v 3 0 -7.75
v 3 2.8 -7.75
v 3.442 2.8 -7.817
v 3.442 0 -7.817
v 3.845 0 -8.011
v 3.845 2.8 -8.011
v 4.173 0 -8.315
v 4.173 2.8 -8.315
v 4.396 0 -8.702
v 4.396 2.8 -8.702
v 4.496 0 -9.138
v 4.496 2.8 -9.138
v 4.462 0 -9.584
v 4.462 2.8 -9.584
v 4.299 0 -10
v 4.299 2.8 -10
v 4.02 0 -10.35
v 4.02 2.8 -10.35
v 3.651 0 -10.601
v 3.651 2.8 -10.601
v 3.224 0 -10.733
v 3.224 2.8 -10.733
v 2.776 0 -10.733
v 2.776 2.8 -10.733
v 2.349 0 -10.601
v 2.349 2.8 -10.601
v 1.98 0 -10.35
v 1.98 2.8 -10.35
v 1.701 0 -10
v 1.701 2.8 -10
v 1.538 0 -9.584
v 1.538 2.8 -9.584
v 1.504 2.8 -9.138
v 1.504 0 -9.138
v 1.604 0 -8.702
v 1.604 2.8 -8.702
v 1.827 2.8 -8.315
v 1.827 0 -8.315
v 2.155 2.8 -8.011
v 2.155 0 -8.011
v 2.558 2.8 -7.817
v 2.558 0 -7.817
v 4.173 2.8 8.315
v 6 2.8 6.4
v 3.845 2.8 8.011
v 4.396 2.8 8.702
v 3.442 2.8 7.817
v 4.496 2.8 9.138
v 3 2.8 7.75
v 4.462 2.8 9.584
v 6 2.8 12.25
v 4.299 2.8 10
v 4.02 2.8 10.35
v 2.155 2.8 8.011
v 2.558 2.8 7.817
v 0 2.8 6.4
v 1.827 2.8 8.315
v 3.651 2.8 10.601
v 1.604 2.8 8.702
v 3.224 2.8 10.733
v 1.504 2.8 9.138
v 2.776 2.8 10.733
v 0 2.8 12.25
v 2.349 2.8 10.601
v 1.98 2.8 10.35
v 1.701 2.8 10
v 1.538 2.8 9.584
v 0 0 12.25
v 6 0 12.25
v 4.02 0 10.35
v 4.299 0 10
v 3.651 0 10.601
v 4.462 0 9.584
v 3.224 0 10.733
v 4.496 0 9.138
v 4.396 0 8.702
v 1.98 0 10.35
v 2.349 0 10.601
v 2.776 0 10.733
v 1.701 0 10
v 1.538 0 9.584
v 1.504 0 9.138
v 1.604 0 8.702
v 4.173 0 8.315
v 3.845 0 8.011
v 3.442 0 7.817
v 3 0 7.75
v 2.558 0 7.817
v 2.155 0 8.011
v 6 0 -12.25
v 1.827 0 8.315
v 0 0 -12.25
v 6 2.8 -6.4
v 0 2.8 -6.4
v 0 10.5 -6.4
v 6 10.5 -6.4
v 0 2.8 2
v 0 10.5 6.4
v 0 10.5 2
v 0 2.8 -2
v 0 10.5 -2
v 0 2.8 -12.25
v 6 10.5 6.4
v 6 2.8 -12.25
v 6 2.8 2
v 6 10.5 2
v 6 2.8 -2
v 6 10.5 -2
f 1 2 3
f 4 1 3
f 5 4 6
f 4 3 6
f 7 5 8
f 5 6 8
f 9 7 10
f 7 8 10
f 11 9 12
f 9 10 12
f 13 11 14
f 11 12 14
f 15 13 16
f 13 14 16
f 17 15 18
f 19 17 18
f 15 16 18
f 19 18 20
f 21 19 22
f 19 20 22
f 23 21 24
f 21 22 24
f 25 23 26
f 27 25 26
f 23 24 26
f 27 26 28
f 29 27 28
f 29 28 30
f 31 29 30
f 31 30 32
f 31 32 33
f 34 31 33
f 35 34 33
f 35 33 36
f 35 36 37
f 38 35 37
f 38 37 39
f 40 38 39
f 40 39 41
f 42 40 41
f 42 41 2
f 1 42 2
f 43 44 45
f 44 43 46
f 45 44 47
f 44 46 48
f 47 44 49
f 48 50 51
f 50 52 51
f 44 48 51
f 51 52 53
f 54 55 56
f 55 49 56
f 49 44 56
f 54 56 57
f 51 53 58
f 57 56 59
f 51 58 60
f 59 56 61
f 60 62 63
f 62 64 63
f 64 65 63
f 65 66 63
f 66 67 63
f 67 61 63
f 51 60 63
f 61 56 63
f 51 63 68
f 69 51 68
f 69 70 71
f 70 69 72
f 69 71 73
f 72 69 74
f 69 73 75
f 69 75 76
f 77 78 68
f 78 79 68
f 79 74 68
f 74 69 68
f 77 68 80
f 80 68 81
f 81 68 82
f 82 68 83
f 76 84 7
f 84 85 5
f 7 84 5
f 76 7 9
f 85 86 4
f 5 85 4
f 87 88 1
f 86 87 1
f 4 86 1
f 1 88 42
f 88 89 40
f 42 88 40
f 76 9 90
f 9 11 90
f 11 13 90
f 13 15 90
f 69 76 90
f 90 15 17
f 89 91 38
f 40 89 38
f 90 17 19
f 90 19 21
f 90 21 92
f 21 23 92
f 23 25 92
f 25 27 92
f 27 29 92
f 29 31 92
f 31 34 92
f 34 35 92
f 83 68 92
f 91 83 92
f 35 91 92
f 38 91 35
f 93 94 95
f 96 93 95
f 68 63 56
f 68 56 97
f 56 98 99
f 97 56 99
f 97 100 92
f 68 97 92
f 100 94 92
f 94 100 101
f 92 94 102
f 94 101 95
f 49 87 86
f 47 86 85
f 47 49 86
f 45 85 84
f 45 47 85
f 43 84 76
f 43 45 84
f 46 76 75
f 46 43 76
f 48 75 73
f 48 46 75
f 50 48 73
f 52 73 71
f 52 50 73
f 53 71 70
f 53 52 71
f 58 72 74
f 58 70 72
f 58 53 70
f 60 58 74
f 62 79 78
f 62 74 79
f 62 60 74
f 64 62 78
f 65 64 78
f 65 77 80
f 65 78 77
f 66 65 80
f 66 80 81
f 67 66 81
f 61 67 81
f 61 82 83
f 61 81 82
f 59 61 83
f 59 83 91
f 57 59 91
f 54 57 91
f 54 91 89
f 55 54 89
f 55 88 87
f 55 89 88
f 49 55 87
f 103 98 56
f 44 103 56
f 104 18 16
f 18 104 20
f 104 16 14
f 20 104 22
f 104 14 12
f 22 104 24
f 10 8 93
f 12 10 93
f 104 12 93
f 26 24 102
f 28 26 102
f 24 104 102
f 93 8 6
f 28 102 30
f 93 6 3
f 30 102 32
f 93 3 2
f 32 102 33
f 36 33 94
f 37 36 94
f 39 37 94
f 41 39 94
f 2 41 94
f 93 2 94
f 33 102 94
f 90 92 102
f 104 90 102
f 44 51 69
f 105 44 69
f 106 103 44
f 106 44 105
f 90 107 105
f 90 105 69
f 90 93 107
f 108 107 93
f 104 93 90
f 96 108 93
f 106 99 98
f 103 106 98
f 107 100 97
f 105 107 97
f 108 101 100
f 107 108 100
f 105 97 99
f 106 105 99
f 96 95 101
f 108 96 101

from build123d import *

# Parameters (mm, degrees)
EXTRUDE_1_DEPTH     = 6
SKETCH_2_R          = 1.5
CUT_EXTRUDE_1_DEPTH = 16.663731995


with BuildPart() as part:
    # 草圖1 → 填料-伸長1 (new body)
    with BuildSketch(Plane(origin=(0, 0, 0), x_dir=(0, 0, -1), z_dir=(1, 0, 0))):
        Polygon((-12.25, 0), (12.25, 0), (12.25, 2.8), (6.4, 2.8), (6.4, 10.5), (2, 10.5), (2, 2.8), (-2, 2.8), (-2, 10.5), (-6.4, 10.5), (-6.4, 2.8), (-12.25, 2.8), align=None)
    extrude(amount=EXTRUDE_1_DEPTH)

    # 草圖2 → 除料-伸長1 (cut, through all)
    with BuildSketch(Plane(origin=(0, 2.8, 0), x_dir=(1, 0, 0), z_dir=(0, 1, 0))):
        with Locations(Location((3, 9.25, 0), (0, 0, 270))):
            Circle(SKETCH_2_R)
    cut_extrude_1 = extrude(amount=-CUT_EXTRUDE_1_DEPTH, mode=Mode.SUBTRACT)

    # 鏡射1: 除料-伸長1 across plane
    add(cut_extrude_1.mirror(Plane.XY), mode=Mode.SUBTRACT)


solid = part.part
